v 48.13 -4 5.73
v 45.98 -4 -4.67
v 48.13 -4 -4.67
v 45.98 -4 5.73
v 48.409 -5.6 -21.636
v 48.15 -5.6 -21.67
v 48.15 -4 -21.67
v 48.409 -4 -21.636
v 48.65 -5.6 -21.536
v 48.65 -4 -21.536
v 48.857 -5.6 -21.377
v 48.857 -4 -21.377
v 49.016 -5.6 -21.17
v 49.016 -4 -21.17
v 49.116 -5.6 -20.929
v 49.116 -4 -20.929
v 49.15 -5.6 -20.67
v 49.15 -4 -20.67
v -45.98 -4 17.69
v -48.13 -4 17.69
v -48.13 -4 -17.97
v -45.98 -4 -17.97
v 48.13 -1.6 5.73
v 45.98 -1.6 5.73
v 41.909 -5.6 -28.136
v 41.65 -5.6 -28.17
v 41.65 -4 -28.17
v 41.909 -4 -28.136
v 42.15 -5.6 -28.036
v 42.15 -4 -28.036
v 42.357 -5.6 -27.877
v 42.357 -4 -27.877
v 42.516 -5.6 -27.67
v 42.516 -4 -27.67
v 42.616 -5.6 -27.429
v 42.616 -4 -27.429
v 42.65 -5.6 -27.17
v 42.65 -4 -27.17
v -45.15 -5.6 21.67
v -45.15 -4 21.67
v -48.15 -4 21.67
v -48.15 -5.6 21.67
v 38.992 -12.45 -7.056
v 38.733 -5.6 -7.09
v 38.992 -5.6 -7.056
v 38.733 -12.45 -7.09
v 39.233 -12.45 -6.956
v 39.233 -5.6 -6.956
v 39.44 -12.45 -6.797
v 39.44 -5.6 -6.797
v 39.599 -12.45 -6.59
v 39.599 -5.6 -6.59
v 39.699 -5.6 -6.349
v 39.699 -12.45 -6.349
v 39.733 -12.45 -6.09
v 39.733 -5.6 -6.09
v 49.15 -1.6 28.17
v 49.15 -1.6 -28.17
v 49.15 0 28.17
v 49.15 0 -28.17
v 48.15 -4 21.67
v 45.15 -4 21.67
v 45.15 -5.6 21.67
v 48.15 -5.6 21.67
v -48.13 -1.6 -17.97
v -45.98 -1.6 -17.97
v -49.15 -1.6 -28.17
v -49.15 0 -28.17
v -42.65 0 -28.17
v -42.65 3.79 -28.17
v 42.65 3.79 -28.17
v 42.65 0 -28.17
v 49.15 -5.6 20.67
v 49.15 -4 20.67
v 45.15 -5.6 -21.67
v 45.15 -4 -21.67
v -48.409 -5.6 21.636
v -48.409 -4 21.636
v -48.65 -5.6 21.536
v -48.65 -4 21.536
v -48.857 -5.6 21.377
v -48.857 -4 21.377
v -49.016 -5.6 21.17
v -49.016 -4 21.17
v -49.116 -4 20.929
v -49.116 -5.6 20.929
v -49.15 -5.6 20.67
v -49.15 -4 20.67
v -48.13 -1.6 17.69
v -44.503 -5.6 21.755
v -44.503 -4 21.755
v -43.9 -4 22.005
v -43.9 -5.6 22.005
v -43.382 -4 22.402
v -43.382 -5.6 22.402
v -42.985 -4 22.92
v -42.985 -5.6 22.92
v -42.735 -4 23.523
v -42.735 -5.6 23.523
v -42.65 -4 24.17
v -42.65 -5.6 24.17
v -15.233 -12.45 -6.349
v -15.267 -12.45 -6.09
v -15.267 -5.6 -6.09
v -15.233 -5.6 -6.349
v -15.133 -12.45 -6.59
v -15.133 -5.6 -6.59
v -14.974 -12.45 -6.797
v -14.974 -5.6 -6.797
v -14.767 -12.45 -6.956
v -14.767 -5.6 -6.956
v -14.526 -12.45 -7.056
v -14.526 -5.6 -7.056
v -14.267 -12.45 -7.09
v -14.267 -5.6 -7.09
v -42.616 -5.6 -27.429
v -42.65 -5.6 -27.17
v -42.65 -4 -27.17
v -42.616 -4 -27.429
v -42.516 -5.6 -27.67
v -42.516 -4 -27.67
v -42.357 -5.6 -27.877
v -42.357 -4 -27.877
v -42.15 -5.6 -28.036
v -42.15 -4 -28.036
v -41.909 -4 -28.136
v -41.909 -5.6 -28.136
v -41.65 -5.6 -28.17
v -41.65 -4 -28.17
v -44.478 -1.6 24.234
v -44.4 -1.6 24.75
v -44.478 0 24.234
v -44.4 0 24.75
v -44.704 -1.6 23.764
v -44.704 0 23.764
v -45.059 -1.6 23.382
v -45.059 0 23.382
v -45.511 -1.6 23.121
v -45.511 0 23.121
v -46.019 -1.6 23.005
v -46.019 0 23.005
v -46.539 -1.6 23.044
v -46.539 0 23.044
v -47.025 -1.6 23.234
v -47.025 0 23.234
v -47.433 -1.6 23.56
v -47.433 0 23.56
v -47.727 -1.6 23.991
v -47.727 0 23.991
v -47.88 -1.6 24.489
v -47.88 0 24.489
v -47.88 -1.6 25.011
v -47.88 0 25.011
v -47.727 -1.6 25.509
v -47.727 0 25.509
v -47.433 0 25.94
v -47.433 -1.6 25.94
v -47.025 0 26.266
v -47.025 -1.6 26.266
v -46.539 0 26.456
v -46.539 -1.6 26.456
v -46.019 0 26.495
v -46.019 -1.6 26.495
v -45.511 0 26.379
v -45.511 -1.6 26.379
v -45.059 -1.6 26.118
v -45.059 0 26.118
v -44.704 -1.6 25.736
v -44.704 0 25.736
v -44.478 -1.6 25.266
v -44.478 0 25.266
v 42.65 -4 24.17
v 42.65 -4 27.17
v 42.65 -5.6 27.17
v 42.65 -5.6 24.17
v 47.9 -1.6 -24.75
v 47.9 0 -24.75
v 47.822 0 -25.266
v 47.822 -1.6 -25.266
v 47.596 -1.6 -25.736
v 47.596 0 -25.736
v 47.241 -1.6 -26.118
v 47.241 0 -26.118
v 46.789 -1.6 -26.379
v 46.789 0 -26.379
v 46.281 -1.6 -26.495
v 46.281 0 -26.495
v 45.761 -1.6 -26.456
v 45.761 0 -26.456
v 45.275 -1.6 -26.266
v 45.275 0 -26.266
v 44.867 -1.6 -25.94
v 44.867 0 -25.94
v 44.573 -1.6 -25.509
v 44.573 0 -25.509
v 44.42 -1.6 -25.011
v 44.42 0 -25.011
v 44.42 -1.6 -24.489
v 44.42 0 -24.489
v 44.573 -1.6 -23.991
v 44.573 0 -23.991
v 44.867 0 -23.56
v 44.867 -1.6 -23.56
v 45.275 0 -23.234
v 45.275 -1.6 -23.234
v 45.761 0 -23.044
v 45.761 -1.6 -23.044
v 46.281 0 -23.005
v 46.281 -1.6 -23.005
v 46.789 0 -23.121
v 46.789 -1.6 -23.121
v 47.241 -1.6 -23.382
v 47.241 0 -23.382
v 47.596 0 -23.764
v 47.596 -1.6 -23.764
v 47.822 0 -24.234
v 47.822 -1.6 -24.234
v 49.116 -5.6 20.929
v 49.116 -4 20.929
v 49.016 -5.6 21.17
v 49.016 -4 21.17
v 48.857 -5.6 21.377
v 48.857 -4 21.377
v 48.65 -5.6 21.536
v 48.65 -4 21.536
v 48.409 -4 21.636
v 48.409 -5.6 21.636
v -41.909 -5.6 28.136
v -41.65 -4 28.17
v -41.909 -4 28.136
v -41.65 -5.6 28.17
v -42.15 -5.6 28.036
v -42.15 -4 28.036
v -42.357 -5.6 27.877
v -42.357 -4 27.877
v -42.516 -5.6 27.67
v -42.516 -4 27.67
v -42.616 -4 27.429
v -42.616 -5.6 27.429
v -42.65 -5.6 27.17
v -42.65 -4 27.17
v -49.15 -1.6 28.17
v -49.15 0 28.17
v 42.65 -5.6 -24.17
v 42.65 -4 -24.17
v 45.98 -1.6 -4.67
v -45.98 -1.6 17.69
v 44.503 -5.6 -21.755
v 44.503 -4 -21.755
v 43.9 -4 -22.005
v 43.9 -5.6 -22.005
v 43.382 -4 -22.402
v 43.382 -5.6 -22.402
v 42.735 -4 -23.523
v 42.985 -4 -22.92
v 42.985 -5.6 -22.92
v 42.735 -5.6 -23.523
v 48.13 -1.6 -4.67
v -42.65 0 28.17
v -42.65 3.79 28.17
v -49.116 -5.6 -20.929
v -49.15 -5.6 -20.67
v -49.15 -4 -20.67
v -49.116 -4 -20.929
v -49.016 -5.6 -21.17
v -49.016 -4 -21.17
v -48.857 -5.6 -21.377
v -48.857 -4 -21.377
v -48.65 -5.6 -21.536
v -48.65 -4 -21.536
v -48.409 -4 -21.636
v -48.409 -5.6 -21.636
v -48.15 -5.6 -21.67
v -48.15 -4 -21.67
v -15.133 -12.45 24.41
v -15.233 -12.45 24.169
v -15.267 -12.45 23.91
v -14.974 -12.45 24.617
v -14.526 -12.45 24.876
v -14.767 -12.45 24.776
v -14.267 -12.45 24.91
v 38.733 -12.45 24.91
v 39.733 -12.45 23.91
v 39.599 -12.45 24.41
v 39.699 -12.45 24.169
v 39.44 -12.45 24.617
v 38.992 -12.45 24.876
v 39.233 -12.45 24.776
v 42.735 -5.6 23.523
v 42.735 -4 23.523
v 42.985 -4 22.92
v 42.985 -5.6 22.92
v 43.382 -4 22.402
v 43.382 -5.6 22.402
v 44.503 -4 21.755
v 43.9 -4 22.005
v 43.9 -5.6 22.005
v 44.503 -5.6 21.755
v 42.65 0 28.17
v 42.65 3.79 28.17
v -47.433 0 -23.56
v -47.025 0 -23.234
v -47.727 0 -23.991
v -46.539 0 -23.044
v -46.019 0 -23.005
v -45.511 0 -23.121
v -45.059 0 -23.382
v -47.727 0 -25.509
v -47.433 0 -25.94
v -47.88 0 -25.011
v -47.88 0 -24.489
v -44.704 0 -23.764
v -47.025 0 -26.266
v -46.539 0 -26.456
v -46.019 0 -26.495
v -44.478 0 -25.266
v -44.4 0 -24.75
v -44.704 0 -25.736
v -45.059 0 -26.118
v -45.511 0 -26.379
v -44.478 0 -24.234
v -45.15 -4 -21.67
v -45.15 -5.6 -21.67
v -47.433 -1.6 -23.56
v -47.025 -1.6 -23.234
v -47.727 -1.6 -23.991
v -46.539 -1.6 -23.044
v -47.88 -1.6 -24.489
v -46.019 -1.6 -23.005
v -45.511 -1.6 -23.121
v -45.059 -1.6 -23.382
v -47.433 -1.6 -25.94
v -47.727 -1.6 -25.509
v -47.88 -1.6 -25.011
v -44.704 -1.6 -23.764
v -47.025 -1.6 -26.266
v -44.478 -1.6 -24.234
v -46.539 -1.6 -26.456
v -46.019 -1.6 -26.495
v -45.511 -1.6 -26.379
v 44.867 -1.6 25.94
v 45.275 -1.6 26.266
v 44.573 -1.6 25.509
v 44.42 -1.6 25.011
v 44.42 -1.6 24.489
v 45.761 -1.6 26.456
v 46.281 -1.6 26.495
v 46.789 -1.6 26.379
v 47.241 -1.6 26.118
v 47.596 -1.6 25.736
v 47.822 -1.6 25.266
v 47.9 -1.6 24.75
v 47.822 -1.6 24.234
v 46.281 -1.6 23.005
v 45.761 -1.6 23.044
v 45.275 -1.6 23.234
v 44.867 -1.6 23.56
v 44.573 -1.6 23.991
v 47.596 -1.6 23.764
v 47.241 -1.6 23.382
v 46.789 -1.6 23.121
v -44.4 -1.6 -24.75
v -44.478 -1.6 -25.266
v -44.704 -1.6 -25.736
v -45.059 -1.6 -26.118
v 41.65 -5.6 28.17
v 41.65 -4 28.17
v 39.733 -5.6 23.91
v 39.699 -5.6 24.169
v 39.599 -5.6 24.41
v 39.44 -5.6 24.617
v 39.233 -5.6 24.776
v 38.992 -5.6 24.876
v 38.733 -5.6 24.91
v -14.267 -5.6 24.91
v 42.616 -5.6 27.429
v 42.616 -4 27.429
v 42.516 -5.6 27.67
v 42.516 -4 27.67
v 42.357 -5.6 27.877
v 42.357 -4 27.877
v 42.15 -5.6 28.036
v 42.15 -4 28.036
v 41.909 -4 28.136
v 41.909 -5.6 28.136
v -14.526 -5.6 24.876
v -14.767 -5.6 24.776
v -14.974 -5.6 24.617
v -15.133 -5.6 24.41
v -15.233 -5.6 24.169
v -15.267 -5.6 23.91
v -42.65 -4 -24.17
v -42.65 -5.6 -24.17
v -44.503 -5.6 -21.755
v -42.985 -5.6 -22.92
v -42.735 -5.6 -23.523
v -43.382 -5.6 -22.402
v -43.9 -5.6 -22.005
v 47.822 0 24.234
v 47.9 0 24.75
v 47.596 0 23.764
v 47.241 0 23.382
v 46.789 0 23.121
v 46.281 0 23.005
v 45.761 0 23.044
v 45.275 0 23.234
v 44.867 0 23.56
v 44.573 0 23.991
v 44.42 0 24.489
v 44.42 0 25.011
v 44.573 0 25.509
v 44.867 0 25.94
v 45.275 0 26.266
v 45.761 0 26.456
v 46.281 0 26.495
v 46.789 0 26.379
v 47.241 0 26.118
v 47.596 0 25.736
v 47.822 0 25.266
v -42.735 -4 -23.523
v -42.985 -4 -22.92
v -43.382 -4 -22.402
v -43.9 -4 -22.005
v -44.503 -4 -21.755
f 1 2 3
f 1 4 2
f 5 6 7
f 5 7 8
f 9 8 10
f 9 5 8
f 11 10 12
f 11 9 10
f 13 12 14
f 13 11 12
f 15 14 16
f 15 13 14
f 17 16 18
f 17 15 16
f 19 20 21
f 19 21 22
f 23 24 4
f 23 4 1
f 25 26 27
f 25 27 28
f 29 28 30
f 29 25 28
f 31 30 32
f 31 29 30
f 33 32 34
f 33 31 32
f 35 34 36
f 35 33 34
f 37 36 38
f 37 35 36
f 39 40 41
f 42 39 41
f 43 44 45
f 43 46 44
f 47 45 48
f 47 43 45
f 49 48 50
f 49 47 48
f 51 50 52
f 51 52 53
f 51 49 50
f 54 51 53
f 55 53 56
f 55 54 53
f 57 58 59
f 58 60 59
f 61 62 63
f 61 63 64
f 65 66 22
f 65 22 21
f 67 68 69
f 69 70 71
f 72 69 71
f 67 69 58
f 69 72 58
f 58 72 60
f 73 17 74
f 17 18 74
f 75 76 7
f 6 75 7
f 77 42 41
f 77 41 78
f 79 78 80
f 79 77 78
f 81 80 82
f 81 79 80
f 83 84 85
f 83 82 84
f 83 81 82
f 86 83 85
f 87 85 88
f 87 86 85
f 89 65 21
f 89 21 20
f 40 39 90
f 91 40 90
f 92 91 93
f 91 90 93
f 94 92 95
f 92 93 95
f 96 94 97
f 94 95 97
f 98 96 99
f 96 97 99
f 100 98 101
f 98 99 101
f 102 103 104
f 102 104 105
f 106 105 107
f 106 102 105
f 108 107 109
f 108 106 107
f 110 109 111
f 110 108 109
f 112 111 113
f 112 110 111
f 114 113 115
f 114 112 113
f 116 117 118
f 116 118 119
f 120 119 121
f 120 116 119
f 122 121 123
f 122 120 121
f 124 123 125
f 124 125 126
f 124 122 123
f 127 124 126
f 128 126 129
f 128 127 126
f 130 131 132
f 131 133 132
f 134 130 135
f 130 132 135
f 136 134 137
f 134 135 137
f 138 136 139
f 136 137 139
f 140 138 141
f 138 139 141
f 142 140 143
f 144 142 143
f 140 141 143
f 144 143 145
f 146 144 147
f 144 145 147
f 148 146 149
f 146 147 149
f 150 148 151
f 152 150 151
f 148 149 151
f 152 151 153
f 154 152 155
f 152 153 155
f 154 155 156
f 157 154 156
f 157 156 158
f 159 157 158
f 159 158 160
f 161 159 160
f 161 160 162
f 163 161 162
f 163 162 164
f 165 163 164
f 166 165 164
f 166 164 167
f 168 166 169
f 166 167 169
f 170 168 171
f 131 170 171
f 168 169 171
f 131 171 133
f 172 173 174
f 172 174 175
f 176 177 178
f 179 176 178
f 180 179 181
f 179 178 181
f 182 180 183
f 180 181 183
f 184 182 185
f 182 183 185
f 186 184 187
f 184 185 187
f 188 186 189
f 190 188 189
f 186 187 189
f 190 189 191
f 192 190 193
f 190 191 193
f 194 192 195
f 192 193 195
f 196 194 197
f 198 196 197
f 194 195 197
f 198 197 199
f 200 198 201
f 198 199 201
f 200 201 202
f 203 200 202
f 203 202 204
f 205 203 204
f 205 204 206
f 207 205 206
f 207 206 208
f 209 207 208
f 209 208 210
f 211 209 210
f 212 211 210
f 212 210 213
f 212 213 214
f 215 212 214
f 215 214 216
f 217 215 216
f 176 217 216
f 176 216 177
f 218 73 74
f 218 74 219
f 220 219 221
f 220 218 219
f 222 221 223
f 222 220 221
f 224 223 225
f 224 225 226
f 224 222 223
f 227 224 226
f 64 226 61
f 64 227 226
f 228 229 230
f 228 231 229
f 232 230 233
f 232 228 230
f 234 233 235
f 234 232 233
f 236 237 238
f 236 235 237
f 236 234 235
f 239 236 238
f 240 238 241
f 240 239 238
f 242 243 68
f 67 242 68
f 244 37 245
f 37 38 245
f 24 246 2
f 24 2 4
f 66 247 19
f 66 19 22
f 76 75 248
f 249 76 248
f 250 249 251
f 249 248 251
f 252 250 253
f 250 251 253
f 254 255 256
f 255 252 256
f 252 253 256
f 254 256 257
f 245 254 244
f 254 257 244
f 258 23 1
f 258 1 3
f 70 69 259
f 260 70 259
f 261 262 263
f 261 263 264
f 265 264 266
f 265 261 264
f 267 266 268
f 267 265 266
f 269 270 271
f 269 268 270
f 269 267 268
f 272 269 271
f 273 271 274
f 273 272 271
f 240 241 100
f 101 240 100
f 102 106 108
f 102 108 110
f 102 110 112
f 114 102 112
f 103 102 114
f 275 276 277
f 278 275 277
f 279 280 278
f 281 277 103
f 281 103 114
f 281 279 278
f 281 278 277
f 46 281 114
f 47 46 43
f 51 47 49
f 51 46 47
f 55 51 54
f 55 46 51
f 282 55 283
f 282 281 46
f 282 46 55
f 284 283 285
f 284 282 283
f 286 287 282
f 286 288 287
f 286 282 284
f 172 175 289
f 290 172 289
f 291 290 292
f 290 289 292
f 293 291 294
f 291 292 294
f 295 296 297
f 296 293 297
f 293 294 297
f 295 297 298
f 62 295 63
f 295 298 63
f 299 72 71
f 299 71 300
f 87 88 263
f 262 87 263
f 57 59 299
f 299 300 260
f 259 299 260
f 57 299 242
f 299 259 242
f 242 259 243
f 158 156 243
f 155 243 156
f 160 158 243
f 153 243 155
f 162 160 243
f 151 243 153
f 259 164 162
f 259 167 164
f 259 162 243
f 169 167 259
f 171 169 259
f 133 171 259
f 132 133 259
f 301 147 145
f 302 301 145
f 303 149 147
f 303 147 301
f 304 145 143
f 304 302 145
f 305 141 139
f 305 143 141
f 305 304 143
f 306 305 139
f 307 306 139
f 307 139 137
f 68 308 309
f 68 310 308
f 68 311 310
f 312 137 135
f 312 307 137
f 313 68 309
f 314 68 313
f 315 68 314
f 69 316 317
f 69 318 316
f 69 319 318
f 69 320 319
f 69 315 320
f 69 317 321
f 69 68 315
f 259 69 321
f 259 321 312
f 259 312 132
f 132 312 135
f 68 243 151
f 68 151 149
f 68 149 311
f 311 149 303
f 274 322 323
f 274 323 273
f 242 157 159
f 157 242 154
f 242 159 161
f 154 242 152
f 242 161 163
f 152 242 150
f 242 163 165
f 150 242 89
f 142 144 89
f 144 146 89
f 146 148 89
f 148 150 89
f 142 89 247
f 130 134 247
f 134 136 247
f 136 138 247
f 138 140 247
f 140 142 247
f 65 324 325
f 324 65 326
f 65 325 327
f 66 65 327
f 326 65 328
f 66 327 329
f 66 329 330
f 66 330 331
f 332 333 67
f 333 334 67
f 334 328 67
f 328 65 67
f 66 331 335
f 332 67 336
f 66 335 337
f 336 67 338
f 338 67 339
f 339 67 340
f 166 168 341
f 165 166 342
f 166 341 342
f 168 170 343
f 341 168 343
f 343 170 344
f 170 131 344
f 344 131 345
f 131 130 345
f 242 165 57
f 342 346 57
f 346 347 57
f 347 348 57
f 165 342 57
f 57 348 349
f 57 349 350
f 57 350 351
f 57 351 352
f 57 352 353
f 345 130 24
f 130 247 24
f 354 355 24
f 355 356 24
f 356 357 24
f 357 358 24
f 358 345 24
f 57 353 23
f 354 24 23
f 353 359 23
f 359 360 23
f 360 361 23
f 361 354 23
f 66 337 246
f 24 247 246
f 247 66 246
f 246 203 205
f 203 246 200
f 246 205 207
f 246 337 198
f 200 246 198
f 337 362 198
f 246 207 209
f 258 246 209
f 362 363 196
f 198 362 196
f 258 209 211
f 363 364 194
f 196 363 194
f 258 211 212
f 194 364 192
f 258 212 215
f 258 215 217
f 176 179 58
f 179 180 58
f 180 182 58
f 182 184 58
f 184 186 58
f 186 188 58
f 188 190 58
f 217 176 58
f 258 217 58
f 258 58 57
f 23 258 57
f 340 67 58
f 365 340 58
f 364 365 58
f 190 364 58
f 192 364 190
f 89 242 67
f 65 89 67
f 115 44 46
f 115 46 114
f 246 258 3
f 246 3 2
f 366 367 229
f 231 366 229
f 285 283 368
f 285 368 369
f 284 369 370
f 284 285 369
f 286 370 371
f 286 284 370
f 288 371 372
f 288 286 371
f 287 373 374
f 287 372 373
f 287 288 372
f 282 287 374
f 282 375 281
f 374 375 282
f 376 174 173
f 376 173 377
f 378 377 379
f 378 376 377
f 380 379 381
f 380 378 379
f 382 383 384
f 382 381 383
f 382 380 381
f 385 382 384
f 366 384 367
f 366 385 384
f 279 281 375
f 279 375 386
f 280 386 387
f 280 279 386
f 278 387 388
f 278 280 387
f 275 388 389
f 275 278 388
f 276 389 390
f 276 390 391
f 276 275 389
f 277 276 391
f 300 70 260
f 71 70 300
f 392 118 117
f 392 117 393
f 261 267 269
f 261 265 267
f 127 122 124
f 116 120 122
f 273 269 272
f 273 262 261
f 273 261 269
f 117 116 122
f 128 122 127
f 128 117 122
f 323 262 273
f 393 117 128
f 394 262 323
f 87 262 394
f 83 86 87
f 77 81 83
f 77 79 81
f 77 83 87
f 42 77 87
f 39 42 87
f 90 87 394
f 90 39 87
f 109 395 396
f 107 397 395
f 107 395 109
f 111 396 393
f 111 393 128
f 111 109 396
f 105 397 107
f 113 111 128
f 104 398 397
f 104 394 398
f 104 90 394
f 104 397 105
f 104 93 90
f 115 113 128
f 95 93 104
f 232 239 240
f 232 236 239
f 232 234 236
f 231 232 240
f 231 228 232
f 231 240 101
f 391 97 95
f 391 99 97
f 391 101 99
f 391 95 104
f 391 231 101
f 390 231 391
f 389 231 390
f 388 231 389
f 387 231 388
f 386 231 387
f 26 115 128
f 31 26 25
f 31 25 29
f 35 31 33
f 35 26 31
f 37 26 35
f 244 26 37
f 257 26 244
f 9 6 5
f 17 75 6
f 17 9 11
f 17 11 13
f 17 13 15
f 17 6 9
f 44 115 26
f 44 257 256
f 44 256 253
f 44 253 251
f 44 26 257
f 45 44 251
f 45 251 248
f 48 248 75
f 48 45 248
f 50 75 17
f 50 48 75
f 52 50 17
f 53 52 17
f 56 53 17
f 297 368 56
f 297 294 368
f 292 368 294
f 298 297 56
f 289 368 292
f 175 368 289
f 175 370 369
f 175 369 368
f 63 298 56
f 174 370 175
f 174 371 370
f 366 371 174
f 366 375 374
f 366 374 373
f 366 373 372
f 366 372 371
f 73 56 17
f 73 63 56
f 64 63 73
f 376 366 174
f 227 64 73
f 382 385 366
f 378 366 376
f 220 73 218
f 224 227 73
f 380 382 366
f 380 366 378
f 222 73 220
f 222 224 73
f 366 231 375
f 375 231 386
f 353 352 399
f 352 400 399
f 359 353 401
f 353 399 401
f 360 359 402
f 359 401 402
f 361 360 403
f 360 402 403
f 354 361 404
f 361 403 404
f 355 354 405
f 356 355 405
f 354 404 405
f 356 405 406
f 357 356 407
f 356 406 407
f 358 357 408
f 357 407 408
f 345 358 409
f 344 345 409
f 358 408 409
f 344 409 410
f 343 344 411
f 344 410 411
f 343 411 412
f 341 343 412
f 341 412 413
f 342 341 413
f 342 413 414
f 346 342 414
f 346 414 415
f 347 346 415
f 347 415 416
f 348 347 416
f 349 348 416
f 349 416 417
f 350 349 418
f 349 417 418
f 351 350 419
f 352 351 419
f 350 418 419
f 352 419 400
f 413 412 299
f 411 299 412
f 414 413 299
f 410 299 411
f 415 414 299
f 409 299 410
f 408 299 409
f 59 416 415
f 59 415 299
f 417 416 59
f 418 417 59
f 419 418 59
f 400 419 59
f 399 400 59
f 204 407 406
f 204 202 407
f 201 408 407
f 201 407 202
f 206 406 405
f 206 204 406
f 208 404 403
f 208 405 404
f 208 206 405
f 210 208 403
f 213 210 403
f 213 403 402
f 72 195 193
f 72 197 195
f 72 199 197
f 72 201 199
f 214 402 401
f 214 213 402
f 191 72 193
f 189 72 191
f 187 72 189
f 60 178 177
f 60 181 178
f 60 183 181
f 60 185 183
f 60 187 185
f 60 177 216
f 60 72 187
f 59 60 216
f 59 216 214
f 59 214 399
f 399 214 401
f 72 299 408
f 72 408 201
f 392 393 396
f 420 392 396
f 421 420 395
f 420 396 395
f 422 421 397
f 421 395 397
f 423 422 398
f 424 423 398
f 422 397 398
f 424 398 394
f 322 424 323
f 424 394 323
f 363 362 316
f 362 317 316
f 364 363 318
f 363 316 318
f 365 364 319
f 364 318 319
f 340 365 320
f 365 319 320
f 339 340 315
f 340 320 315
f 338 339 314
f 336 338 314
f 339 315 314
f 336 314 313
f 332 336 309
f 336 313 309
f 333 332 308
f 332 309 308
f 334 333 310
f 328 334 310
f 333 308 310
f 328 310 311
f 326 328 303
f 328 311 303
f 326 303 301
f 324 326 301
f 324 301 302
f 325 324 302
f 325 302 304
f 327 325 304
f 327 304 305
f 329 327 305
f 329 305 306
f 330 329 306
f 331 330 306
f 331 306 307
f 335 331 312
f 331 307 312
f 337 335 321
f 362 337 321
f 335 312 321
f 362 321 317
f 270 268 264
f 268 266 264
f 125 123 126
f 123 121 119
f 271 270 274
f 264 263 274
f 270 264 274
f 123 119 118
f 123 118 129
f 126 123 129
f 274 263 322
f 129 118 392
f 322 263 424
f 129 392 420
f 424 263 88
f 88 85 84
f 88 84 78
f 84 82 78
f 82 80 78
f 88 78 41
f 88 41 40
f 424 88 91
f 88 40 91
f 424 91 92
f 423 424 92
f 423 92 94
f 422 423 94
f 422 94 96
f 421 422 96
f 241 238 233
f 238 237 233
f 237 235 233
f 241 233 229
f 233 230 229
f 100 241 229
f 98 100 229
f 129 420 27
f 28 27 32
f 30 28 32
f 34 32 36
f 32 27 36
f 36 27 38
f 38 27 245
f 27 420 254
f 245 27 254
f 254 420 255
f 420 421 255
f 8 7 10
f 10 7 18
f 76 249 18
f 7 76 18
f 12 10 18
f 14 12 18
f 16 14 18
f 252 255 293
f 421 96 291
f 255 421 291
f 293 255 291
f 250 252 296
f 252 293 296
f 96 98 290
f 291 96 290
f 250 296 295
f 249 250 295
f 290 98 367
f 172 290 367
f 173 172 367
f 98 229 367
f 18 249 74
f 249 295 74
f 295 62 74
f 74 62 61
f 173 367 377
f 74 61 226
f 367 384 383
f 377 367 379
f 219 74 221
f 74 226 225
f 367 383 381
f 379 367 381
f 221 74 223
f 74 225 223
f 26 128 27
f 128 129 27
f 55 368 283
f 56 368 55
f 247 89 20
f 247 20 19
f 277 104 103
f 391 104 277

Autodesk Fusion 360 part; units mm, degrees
sketch "TFT_PCB" plane through (0, 0, 0) normal (0, 1, 0) x (1, 0, 0)
  line L0 (49.15, -28.17) -> (-49.15, -28.17)
  line L1 (-49.15, -28.17) -> (-49.15, 28.17)
  line L2 (-49.15, 28.17) -> (49.15, 28.17)
  line L3 (49.15, 28.17) -> (49.15, -28.17)
  line L4 (49.15, -28.17) -> (-49.15, 28.17) construction
  line L5 (-49.15, -28.17) -> (49.15, 28.17) construction
  line L6 (-42.65, 28.17) -> (-42.65, -28.17)
  line L7 (42.65, 28.17) -> (42.65, -28.17)
  circle A0 centre (-46.15, 24.75) radius 1.75
  line L8 (0, 28.17) -> (0, -28.17) construction
  line L9 (-49.15, 0) -> (49.15, 0) construction
  circle A1 centre (46.15, 24.75) radius 1.75
  circle A2 centre (-46.15, -24.75) radius 1.75
  circle A3 centre (46.15, -24.75) radius 1.75
  dimension "d4" = 98.3
  dimension "d5" = 56.34
  dimension "d6" = 6.5
  dimension "d7" = 6.5
  dimension "d8" = 3.5
  dimension "d9" = 3.42
  dimension "d10" = 3
extrude "Extrude1" add sketch "TFT_PCB" against normal blind 1.6 makes body 1
extrude "Extrude2" add sketch "TFT_PCB" along normal blind 3.79 contours L0 L2 L6 L7 bodies 1
sketch "Sketch2" plane through (0, -1.6, 0) normal (0, -1, 0) x (1, 0, 0)
  circle A0 centre (-46.15, 24.75) radius 1.75
  circle A1 centre (46.15, -24.75) radius 1.75
  circle A2 centre (46.15, 24.75) radius 1.75
  circle A3 centre (-46.15, -24.75) radius 1.75
  line L0 (-49.15, -28.17) -> (49.15, -28.17)
  line L1 (49.15, -28.17) -> (49.15, 28.17)
  line L2 (49.15, 28.17) -> (-49.15, 28.17)
  line L3 (-49.15, 28.17) -> (-49.15, -28.17)
  line L4 (-48.13, 17.69) -> (-45.98, 17.69)
  line L5 (-45.98, 17.69) -> (-45.98, -17.97)
  line L6 (-45.98, -17.97) -> (-48.13, -17.97)
  line L7 (-48.13, -17.97) -> (-48.13, 17.69)
  line L8 (45.98, 5.73) -> (48.13, 5.73)
  line L9 (48.13, 5.73) -> (48.13, -4.67)
  line L10 (48.13, -4.67) -> (45.98, -4.67)
  line L11 (45.98, -4.67) -> (45.98, 5.73)
  dimension "d15" = 2.15
  dimension "d16" = 35.66
  dimension "d17" = 10.2
  dimension "d18" = 1.02
  dimension "d19" = 2.15
  dimension "d20" = 10.4
  dimension "d21" = 1.02
  dimension "d22" = 23.5
extrude "Extrude3" add sketch "Sketch2" along normal blind 2.4 contours L4 L5 L6 L7 | L8 L9 L10 L11 bodies 1
sketch "Sketch3" plane through (0, -4, 0) normal (0, -1, 0) x (1, 0, 0)
  line L0 (-48.13, -17.97) -> (-45.98, -17.97)
  line L1 (-45.98, -17.97) -> (-45.98, 17.69)
  line L2 (-45.98, 17.69) -> (-48.13, 17.69)
  line L3 (-48.13, 17.69) -> (-48.13, -17.97)
  line L4 (45.98, -4.67) -> (45.98, 5.73)
  line L5 (45.98, 5.73) -> (48.13, 5.73)
  line L6 (48.13, 5.73) -> (48.13, -4.67)
  line L7 (48.13, -4.67) -> (45.98, -4.67)
  line L8 (-48.13, -17.97) -> (-48.13, 17.69)
  line L9 (-48.13, 17.69) -> (-45.98, 17.69)
  line L10 (-45.98, 17.69) -> (-45.98, -17.97)
  line L11 (-45.98, -17.97) -> (-48.13, -17.97)
  circle A0 centre (-46.15, 24.75) radius 1.75
  circle A1 centre (46.15, -24.75) radius 1.75
  circle A2 centre (46.15, 24.75) radius 1.75
  circle A3 centre (-46.15, -24.75) radius 1.75
  line L12 (-49.15, -28.17) -> (49.15, -28.17)
  line L13 (49.15, -28.17) -> (49.15, 28.17)
  line L14 (49.15, 28.17) -> (-49.15, 28.17)
  line L15 (-49.15, 28.17) -> (-49.15, -28.17)
  line L16 (-49.15, 28.17) -> (-42.65, 28.17)
  line L17 (-42.65, 28.17) -> (-42.65, 21.67)
  line L18 (-42.65, 21.67) -> (-49.15, 21.67)
  line L19 (-49.15, 21.67) -> (-49.15, 28.17)
  line L20 (0, 28.17) -> (0, -28.17) construction
  line L21 (-49.15, 0) -> (49.15, 0) construction
  line L22 (42.65, 28.17) -> (42.65, 21.67)
  line L23 (42.65, 21.67) -> (49.15, 21.67)
  line L24 (42.65, -21.67) -> (49.15, -21.67)
  line L25 (42.65, -28.17) -> (42.65, -21.67)
  line L26 (-42.65, -21.67) -> (-49.15, -21.67)
  line L27 (-42.65, -28.17) -> (-42.65, -21.67)
  line L28 (-15.2668, 24.9101) -> (39.7332, 24.9101)
  line L29 (39.7332, 24.9101) -> (39.7332, -7.0899)
  line L30 (39.7332, -7.0899) -> (-15.2668, -7.0899)
  line L31 (-15.2668, -7.0899) -> (-15.2668, 24.9101)
  dimension "d25" = 6.5
  dimension "d26" = 6.5
  dimension "d27" = 55
  dimension "d28" = 32
extrude "Extrude4" add sketch "Sketch3" along normal blind 1.6 separate body contours L0 L1 L2 L3 L8 L9 L10 L11 | L4 L5 L6 L7 | L12 L13 L14 L15 L17 L18 L22 L23 L24 L25 L26 L27 | L28 L29 L30 L31 makes body 2
extrude "Extrude5" add sketch "Sketch3" along normal blind 8.45 contours L28 L29 L30 L31 bodies 2
fillet "Fillet1" radius 2.5 4 edges at (-42.65, -4.8, 21.67) (-42.65, -4.8, -21.67) (42.65, -4.8, -21.67) (42.65, -4.8, 21.67) on bodies 2
fillet "Fillet2" radius 1 8 edges at (42.65, -4.8, -28.17) (49.15, -4.8, -21.67) (49.15, -4.8, 21.67) (42.65, -4.8, 28.17) (-42.65, -4.8, 28.17) (-49.15, -4.8, 21.67) (-49.15, -4.8, -21.67) (-42.65, -4.8, -28.17) on bodies 2
fillet "Fillet3" radius 1 4 edges at (39.7332, -9.025, 24.9101) (39.7332, -9.025, -7.0899) (-15.2668, -9.025, 24.9101) (-15.2668, -9.025, -7.0899) on bodies 2
equation "pcb_height = 56.34 mm"
equation "pcb_width = 98.3 mm"
equation "d4 = pcb_width"
equation "d5 = pcb_height"
equation "d31 = 1.6 mm + 6.85 mm"
